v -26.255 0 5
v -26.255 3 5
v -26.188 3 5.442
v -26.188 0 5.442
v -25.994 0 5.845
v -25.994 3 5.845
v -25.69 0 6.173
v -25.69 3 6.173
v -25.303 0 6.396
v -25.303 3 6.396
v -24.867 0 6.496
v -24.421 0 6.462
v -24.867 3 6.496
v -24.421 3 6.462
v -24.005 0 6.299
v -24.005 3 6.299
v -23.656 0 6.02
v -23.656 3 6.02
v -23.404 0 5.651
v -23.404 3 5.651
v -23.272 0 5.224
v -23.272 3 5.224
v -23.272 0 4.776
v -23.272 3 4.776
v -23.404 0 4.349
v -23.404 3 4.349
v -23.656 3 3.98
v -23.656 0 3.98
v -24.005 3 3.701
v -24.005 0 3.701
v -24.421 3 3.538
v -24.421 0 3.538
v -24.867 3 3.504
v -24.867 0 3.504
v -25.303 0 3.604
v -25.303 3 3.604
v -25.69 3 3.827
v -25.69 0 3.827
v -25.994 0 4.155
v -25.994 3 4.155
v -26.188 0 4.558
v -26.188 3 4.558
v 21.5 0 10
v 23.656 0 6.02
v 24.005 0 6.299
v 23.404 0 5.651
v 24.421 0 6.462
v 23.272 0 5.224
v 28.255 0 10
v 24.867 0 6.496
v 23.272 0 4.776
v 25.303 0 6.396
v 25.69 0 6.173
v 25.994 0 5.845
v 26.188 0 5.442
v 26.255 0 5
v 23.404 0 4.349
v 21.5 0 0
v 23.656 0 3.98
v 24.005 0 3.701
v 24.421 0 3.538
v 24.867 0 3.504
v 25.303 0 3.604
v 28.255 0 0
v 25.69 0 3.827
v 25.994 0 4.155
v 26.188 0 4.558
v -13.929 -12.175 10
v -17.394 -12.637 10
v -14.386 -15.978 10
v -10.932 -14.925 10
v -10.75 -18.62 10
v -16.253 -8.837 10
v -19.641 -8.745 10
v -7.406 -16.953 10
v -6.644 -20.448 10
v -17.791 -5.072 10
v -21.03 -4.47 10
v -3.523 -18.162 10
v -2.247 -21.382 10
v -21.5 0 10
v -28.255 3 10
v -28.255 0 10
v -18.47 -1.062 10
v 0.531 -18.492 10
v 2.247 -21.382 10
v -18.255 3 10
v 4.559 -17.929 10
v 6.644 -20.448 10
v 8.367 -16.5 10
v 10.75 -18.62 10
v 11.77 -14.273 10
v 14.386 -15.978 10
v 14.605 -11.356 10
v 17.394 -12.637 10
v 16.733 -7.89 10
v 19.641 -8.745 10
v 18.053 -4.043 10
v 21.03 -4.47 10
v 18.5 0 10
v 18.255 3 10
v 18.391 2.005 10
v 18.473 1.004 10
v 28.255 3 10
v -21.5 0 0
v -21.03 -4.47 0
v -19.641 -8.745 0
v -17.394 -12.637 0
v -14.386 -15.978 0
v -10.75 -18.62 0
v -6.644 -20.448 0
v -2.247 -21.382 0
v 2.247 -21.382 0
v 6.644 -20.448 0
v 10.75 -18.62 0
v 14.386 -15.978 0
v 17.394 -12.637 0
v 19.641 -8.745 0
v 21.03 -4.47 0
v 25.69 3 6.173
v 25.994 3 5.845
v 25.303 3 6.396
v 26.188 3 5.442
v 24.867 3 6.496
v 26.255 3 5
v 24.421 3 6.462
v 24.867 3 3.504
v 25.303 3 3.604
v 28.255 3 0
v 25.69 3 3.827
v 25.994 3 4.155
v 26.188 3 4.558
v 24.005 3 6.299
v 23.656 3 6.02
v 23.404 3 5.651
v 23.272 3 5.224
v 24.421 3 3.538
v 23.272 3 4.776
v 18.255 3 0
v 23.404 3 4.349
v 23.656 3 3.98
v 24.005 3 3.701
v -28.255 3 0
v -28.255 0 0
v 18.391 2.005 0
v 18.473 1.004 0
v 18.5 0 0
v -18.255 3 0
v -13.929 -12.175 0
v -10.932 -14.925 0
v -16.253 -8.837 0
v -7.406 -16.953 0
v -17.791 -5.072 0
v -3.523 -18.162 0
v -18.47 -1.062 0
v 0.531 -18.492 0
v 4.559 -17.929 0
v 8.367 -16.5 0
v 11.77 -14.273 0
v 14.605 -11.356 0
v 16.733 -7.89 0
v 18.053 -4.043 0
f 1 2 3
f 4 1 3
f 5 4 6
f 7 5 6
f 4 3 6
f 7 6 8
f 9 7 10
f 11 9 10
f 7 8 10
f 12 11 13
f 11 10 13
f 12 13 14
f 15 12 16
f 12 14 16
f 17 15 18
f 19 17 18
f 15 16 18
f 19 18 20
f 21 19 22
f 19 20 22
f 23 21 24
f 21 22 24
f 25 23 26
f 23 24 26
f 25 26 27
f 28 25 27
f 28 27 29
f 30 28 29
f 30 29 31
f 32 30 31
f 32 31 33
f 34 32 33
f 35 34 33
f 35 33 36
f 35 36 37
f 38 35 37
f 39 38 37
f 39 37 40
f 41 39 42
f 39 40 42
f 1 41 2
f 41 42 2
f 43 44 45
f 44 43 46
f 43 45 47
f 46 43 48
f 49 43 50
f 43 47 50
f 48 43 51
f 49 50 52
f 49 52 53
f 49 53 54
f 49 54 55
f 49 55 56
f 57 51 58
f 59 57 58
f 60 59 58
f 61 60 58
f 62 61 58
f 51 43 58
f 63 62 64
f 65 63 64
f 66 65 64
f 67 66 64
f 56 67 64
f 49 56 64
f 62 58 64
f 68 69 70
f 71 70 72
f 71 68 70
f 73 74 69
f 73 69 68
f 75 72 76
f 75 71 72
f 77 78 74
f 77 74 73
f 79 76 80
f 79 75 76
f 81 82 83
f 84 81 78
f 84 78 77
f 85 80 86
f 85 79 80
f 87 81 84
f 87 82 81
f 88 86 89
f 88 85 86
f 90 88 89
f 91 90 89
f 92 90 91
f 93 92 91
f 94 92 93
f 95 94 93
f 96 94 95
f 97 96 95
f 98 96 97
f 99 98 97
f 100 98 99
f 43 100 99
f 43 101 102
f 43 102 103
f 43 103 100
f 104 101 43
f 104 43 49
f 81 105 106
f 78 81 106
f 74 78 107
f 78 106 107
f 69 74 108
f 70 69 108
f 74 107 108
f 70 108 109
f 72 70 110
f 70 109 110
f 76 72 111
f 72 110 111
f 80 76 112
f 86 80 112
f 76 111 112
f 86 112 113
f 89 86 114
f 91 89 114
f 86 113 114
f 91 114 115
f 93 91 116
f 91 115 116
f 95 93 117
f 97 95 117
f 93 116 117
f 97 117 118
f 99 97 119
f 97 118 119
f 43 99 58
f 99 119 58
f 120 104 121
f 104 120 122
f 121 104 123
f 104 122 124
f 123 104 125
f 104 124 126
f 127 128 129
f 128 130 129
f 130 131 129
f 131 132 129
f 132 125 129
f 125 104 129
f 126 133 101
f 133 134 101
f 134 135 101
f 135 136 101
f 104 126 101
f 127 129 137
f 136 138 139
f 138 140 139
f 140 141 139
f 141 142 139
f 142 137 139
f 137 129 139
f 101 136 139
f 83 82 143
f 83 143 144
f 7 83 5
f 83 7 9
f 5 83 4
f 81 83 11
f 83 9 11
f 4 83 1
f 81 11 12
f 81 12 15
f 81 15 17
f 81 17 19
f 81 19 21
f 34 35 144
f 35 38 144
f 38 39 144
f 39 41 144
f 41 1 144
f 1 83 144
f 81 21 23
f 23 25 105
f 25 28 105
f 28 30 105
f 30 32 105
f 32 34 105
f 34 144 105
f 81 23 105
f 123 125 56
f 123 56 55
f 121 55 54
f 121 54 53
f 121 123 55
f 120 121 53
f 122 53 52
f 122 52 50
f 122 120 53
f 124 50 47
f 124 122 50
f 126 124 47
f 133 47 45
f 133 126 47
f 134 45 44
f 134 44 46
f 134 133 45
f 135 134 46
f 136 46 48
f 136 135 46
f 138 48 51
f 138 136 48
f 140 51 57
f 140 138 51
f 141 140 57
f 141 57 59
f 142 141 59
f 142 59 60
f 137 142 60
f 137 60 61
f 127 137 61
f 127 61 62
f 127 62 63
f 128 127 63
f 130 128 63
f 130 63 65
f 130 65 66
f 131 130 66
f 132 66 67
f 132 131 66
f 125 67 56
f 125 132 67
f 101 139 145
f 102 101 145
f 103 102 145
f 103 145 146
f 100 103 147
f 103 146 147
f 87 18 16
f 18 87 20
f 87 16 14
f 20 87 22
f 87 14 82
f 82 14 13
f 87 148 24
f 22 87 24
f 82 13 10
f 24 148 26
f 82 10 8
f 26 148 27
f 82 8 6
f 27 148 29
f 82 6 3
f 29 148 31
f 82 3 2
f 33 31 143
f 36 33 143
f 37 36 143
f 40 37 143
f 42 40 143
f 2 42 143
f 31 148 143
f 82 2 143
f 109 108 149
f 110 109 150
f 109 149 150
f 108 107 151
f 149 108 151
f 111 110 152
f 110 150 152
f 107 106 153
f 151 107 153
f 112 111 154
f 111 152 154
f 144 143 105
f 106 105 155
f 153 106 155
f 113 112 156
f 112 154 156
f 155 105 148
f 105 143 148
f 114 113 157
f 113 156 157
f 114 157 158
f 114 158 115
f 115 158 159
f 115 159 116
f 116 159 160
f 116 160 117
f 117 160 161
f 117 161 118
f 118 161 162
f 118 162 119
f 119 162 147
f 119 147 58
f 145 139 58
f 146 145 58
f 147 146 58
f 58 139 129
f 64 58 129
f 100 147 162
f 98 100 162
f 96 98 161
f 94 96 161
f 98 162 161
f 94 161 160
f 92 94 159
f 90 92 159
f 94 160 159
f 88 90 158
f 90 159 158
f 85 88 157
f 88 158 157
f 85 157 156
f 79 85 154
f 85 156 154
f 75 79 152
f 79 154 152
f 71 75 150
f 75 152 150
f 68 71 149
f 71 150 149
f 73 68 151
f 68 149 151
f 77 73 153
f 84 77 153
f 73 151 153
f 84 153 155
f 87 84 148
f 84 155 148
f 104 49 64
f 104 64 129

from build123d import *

# Parameters (mm, degrees)
BOSS_EXTRUDE1_DEPTH = 10
CUT_EXTRUDE1_DEPTH  = 3


with BuildPart() as part:
    # Sketch1 → Boss-Extrude1 (new body)
    with BuildSketch(Plane.XY):
        with BuildLine():
            ThreePointArc((18.5, 0), (-1.504988227, -18.438682449), (-18.255136264, 3))
            Line((-18.255136264, 3), (-28.255136264, 3))
            Line((-28.255136264, 3), (-28.255136264, 0))
            Line((-28.255136264, 0), (-21.5, 0))
            ThreePointArc((-21.5, 0), (0, -21.5), (21.5, 0))
            Line((21.5, 0), (28.255136264, 0))
            Line((28.255136264, 0), (28.255136264, 3))
            Line((28.255136264, 3), (18.255136264, 3))
            ThreePointArc((18.255136264, 3), (18.438682449, 1.504988227), (18.5, 0))
        make_face()
    extrude(amount=BOSS_EXTRUDE1_DEPTH)

    # Sketch2 → Cut-Extrude1 (cut)
    with BuildSketch(Plane(origin=(0, 3, 0), x_dir=(1, 0, 0), z_dir=(0, 1, 0))):
        with BuildLine():
            ThreePointArc((-23.255136264, -5), (-24.755136264, -3.5), (-26.255136264, -5))
            Line((-26.255136264, -5), (-23.255136264, -5))
        make_face()
        with BuildLine():
            Line((-23.255136264, -5), (-26.255136264, -5))
            ThreePointArc((-26.255136264, -5), (-24.755136264, -6.5), (-23.255136264, -5))
        make_face()
    cut_extrude1 = extrude(amount=-CUT_EXTRUDE1_DEPTH, mode=Mode.SUBTRACT)

    # Mirror1: Cut-Extrude1 across plane
    add(cut_extrude1.mirror(Plane(origin=(0, 0, 0), x_dir=(0, 0, 1), z_dir=(1, 0, 0))), mode=Mode.SUBTRACT)


solid = part.part
